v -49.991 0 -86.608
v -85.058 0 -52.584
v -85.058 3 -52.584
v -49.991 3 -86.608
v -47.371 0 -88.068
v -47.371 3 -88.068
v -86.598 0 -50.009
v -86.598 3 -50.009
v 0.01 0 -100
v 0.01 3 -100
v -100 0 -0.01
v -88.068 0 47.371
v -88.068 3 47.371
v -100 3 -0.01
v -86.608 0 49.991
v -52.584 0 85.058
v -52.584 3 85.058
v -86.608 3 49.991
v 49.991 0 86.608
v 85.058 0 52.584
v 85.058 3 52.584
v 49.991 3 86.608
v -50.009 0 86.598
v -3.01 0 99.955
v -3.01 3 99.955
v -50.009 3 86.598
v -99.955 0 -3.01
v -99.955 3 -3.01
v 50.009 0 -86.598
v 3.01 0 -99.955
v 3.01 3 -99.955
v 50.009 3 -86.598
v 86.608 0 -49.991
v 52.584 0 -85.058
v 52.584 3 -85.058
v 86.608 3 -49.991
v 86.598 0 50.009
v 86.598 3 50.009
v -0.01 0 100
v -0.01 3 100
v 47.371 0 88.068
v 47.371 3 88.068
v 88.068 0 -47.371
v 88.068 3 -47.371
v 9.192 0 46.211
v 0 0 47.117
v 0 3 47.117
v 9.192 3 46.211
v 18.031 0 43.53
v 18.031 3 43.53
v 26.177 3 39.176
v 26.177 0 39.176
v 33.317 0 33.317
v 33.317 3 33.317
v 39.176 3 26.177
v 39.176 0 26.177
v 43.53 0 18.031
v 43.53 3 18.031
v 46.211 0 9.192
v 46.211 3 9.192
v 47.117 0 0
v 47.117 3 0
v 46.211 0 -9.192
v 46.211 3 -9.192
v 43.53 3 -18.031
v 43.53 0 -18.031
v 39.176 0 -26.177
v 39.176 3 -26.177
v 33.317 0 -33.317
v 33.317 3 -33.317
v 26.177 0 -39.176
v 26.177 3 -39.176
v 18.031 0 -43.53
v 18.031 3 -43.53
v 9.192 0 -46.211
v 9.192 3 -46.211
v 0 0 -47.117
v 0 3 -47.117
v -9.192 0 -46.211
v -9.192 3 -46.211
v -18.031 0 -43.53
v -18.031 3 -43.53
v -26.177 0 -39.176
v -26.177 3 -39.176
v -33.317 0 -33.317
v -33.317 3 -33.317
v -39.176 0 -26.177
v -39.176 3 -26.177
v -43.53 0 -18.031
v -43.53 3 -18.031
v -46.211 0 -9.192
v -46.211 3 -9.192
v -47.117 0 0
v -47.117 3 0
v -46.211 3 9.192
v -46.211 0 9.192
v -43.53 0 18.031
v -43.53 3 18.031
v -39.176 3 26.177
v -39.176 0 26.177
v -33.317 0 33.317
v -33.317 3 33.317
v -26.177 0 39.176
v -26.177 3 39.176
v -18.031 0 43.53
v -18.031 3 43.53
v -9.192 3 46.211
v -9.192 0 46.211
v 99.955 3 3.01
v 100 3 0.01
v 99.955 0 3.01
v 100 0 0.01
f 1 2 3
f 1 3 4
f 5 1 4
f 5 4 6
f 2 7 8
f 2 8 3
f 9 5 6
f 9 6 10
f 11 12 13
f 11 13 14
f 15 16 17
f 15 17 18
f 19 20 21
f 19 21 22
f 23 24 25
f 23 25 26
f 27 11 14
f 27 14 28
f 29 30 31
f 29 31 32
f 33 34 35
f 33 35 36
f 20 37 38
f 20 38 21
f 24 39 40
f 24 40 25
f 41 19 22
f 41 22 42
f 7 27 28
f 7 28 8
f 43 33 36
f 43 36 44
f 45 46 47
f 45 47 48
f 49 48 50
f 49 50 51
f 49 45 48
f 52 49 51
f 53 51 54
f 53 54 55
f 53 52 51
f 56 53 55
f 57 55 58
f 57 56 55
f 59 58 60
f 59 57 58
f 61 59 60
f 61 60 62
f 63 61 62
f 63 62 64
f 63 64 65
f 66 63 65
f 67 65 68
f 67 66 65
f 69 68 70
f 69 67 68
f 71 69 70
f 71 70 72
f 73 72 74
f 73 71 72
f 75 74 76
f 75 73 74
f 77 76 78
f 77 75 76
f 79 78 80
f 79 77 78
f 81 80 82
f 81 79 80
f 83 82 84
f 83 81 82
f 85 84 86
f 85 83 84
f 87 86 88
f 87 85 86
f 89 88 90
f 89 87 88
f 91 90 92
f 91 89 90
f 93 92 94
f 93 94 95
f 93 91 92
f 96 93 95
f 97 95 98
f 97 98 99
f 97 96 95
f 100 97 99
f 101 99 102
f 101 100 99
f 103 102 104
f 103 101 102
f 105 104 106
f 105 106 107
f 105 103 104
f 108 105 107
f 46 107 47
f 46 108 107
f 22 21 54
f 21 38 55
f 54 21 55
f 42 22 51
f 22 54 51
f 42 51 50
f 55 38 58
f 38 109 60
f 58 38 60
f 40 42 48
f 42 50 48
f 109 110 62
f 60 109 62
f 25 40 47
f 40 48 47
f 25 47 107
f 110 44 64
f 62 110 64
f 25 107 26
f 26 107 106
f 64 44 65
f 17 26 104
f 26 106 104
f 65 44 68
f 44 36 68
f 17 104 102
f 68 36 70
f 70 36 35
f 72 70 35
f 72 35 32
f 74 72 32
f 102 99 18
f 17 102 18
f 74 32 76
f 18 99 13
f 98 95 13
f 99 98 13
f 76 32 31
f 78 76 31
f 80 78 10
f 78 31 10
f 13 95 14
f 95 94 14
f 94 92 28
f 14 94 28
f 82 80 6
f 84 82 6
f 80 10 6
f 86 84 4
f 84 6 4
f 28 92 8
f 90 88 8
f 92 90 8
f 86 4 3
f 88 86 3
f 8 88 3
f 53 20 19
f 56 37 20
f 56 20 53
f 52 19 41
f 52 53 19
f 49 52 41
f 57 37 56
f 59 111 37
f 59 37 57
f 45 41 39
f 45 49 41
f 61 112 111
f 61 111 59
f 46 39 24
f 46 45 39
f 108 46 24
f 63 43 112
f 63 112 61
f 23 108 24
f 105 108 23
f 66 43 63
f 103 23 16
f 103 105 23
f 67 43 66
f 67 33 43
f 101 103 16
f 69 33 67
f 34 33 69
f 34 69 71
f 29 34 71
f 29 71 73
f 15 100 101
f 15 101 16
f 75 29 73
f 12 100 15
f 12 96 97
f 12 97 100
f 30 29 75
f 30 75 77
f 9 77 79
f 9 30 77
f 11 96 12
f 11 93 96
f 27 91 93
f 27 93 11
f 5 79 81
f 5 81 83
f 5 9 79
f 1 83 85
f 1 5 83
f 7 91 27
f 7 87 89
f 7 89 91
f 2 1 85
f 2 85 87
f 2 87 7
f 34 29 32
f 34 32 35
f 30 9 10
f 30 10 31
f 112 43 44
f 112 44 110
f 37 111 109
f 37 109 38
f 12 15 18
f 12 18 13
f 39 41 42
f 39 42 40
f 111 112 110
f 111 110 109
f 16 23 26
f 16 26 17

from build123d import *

# Parameters (mm, degrees)
SKETCH1_R           = 47.116713319
BOSS_EXTRUDE1_DEPTH = 3


with BuildPart() as part:
    # Sketch1 → Boss-Extrude1 (new body)
    with BuildSketch(Plane(origin=(0, 0, 0), x_dir=(1, 0, 0), z_dir=(0, 1, 0))):
        Polygon((-88.068159647, -47.370869281), (-99.999999495, 0.010045682), (-99.954698159, 3.009703627), (-86.597517101, 50.008699563), (-85.05845602, 52.583828878), (-49.991299932, 86.607562782), (-47.370869281, 88.068159647), (0.010045682, 99.999999495), (3.009703627, 99.954698159), (50.008699563, 86.597517101), (52.583828878, 85.05845602), (86.607562782, 49.991299932), (88.068159647, 47.370869281), (99.999999495, -0.010045682), (99.954698159, -3.009703627), (86.597517101, -50.008699563), (85.05845602, -52.583828878), (49.991299932, -86.607562782), (47.370869281, -88.068159647), (-0.010045682, -99.999999495), (-3.009703627, -99.954698159), (-50.008699563, -86.597517101), (-52.583828878, -85.05845602), (-86.607562782, -49.991299932), align=None)
        with Locations(Location((0, 0, 0), (0, 0, 270))):
            Circle(SKETCH1_R, mode=Mode.SUBTRACT)
    extrude(amount=BOSS_EXTRUDE1_DEPTH)


solid = part.part
